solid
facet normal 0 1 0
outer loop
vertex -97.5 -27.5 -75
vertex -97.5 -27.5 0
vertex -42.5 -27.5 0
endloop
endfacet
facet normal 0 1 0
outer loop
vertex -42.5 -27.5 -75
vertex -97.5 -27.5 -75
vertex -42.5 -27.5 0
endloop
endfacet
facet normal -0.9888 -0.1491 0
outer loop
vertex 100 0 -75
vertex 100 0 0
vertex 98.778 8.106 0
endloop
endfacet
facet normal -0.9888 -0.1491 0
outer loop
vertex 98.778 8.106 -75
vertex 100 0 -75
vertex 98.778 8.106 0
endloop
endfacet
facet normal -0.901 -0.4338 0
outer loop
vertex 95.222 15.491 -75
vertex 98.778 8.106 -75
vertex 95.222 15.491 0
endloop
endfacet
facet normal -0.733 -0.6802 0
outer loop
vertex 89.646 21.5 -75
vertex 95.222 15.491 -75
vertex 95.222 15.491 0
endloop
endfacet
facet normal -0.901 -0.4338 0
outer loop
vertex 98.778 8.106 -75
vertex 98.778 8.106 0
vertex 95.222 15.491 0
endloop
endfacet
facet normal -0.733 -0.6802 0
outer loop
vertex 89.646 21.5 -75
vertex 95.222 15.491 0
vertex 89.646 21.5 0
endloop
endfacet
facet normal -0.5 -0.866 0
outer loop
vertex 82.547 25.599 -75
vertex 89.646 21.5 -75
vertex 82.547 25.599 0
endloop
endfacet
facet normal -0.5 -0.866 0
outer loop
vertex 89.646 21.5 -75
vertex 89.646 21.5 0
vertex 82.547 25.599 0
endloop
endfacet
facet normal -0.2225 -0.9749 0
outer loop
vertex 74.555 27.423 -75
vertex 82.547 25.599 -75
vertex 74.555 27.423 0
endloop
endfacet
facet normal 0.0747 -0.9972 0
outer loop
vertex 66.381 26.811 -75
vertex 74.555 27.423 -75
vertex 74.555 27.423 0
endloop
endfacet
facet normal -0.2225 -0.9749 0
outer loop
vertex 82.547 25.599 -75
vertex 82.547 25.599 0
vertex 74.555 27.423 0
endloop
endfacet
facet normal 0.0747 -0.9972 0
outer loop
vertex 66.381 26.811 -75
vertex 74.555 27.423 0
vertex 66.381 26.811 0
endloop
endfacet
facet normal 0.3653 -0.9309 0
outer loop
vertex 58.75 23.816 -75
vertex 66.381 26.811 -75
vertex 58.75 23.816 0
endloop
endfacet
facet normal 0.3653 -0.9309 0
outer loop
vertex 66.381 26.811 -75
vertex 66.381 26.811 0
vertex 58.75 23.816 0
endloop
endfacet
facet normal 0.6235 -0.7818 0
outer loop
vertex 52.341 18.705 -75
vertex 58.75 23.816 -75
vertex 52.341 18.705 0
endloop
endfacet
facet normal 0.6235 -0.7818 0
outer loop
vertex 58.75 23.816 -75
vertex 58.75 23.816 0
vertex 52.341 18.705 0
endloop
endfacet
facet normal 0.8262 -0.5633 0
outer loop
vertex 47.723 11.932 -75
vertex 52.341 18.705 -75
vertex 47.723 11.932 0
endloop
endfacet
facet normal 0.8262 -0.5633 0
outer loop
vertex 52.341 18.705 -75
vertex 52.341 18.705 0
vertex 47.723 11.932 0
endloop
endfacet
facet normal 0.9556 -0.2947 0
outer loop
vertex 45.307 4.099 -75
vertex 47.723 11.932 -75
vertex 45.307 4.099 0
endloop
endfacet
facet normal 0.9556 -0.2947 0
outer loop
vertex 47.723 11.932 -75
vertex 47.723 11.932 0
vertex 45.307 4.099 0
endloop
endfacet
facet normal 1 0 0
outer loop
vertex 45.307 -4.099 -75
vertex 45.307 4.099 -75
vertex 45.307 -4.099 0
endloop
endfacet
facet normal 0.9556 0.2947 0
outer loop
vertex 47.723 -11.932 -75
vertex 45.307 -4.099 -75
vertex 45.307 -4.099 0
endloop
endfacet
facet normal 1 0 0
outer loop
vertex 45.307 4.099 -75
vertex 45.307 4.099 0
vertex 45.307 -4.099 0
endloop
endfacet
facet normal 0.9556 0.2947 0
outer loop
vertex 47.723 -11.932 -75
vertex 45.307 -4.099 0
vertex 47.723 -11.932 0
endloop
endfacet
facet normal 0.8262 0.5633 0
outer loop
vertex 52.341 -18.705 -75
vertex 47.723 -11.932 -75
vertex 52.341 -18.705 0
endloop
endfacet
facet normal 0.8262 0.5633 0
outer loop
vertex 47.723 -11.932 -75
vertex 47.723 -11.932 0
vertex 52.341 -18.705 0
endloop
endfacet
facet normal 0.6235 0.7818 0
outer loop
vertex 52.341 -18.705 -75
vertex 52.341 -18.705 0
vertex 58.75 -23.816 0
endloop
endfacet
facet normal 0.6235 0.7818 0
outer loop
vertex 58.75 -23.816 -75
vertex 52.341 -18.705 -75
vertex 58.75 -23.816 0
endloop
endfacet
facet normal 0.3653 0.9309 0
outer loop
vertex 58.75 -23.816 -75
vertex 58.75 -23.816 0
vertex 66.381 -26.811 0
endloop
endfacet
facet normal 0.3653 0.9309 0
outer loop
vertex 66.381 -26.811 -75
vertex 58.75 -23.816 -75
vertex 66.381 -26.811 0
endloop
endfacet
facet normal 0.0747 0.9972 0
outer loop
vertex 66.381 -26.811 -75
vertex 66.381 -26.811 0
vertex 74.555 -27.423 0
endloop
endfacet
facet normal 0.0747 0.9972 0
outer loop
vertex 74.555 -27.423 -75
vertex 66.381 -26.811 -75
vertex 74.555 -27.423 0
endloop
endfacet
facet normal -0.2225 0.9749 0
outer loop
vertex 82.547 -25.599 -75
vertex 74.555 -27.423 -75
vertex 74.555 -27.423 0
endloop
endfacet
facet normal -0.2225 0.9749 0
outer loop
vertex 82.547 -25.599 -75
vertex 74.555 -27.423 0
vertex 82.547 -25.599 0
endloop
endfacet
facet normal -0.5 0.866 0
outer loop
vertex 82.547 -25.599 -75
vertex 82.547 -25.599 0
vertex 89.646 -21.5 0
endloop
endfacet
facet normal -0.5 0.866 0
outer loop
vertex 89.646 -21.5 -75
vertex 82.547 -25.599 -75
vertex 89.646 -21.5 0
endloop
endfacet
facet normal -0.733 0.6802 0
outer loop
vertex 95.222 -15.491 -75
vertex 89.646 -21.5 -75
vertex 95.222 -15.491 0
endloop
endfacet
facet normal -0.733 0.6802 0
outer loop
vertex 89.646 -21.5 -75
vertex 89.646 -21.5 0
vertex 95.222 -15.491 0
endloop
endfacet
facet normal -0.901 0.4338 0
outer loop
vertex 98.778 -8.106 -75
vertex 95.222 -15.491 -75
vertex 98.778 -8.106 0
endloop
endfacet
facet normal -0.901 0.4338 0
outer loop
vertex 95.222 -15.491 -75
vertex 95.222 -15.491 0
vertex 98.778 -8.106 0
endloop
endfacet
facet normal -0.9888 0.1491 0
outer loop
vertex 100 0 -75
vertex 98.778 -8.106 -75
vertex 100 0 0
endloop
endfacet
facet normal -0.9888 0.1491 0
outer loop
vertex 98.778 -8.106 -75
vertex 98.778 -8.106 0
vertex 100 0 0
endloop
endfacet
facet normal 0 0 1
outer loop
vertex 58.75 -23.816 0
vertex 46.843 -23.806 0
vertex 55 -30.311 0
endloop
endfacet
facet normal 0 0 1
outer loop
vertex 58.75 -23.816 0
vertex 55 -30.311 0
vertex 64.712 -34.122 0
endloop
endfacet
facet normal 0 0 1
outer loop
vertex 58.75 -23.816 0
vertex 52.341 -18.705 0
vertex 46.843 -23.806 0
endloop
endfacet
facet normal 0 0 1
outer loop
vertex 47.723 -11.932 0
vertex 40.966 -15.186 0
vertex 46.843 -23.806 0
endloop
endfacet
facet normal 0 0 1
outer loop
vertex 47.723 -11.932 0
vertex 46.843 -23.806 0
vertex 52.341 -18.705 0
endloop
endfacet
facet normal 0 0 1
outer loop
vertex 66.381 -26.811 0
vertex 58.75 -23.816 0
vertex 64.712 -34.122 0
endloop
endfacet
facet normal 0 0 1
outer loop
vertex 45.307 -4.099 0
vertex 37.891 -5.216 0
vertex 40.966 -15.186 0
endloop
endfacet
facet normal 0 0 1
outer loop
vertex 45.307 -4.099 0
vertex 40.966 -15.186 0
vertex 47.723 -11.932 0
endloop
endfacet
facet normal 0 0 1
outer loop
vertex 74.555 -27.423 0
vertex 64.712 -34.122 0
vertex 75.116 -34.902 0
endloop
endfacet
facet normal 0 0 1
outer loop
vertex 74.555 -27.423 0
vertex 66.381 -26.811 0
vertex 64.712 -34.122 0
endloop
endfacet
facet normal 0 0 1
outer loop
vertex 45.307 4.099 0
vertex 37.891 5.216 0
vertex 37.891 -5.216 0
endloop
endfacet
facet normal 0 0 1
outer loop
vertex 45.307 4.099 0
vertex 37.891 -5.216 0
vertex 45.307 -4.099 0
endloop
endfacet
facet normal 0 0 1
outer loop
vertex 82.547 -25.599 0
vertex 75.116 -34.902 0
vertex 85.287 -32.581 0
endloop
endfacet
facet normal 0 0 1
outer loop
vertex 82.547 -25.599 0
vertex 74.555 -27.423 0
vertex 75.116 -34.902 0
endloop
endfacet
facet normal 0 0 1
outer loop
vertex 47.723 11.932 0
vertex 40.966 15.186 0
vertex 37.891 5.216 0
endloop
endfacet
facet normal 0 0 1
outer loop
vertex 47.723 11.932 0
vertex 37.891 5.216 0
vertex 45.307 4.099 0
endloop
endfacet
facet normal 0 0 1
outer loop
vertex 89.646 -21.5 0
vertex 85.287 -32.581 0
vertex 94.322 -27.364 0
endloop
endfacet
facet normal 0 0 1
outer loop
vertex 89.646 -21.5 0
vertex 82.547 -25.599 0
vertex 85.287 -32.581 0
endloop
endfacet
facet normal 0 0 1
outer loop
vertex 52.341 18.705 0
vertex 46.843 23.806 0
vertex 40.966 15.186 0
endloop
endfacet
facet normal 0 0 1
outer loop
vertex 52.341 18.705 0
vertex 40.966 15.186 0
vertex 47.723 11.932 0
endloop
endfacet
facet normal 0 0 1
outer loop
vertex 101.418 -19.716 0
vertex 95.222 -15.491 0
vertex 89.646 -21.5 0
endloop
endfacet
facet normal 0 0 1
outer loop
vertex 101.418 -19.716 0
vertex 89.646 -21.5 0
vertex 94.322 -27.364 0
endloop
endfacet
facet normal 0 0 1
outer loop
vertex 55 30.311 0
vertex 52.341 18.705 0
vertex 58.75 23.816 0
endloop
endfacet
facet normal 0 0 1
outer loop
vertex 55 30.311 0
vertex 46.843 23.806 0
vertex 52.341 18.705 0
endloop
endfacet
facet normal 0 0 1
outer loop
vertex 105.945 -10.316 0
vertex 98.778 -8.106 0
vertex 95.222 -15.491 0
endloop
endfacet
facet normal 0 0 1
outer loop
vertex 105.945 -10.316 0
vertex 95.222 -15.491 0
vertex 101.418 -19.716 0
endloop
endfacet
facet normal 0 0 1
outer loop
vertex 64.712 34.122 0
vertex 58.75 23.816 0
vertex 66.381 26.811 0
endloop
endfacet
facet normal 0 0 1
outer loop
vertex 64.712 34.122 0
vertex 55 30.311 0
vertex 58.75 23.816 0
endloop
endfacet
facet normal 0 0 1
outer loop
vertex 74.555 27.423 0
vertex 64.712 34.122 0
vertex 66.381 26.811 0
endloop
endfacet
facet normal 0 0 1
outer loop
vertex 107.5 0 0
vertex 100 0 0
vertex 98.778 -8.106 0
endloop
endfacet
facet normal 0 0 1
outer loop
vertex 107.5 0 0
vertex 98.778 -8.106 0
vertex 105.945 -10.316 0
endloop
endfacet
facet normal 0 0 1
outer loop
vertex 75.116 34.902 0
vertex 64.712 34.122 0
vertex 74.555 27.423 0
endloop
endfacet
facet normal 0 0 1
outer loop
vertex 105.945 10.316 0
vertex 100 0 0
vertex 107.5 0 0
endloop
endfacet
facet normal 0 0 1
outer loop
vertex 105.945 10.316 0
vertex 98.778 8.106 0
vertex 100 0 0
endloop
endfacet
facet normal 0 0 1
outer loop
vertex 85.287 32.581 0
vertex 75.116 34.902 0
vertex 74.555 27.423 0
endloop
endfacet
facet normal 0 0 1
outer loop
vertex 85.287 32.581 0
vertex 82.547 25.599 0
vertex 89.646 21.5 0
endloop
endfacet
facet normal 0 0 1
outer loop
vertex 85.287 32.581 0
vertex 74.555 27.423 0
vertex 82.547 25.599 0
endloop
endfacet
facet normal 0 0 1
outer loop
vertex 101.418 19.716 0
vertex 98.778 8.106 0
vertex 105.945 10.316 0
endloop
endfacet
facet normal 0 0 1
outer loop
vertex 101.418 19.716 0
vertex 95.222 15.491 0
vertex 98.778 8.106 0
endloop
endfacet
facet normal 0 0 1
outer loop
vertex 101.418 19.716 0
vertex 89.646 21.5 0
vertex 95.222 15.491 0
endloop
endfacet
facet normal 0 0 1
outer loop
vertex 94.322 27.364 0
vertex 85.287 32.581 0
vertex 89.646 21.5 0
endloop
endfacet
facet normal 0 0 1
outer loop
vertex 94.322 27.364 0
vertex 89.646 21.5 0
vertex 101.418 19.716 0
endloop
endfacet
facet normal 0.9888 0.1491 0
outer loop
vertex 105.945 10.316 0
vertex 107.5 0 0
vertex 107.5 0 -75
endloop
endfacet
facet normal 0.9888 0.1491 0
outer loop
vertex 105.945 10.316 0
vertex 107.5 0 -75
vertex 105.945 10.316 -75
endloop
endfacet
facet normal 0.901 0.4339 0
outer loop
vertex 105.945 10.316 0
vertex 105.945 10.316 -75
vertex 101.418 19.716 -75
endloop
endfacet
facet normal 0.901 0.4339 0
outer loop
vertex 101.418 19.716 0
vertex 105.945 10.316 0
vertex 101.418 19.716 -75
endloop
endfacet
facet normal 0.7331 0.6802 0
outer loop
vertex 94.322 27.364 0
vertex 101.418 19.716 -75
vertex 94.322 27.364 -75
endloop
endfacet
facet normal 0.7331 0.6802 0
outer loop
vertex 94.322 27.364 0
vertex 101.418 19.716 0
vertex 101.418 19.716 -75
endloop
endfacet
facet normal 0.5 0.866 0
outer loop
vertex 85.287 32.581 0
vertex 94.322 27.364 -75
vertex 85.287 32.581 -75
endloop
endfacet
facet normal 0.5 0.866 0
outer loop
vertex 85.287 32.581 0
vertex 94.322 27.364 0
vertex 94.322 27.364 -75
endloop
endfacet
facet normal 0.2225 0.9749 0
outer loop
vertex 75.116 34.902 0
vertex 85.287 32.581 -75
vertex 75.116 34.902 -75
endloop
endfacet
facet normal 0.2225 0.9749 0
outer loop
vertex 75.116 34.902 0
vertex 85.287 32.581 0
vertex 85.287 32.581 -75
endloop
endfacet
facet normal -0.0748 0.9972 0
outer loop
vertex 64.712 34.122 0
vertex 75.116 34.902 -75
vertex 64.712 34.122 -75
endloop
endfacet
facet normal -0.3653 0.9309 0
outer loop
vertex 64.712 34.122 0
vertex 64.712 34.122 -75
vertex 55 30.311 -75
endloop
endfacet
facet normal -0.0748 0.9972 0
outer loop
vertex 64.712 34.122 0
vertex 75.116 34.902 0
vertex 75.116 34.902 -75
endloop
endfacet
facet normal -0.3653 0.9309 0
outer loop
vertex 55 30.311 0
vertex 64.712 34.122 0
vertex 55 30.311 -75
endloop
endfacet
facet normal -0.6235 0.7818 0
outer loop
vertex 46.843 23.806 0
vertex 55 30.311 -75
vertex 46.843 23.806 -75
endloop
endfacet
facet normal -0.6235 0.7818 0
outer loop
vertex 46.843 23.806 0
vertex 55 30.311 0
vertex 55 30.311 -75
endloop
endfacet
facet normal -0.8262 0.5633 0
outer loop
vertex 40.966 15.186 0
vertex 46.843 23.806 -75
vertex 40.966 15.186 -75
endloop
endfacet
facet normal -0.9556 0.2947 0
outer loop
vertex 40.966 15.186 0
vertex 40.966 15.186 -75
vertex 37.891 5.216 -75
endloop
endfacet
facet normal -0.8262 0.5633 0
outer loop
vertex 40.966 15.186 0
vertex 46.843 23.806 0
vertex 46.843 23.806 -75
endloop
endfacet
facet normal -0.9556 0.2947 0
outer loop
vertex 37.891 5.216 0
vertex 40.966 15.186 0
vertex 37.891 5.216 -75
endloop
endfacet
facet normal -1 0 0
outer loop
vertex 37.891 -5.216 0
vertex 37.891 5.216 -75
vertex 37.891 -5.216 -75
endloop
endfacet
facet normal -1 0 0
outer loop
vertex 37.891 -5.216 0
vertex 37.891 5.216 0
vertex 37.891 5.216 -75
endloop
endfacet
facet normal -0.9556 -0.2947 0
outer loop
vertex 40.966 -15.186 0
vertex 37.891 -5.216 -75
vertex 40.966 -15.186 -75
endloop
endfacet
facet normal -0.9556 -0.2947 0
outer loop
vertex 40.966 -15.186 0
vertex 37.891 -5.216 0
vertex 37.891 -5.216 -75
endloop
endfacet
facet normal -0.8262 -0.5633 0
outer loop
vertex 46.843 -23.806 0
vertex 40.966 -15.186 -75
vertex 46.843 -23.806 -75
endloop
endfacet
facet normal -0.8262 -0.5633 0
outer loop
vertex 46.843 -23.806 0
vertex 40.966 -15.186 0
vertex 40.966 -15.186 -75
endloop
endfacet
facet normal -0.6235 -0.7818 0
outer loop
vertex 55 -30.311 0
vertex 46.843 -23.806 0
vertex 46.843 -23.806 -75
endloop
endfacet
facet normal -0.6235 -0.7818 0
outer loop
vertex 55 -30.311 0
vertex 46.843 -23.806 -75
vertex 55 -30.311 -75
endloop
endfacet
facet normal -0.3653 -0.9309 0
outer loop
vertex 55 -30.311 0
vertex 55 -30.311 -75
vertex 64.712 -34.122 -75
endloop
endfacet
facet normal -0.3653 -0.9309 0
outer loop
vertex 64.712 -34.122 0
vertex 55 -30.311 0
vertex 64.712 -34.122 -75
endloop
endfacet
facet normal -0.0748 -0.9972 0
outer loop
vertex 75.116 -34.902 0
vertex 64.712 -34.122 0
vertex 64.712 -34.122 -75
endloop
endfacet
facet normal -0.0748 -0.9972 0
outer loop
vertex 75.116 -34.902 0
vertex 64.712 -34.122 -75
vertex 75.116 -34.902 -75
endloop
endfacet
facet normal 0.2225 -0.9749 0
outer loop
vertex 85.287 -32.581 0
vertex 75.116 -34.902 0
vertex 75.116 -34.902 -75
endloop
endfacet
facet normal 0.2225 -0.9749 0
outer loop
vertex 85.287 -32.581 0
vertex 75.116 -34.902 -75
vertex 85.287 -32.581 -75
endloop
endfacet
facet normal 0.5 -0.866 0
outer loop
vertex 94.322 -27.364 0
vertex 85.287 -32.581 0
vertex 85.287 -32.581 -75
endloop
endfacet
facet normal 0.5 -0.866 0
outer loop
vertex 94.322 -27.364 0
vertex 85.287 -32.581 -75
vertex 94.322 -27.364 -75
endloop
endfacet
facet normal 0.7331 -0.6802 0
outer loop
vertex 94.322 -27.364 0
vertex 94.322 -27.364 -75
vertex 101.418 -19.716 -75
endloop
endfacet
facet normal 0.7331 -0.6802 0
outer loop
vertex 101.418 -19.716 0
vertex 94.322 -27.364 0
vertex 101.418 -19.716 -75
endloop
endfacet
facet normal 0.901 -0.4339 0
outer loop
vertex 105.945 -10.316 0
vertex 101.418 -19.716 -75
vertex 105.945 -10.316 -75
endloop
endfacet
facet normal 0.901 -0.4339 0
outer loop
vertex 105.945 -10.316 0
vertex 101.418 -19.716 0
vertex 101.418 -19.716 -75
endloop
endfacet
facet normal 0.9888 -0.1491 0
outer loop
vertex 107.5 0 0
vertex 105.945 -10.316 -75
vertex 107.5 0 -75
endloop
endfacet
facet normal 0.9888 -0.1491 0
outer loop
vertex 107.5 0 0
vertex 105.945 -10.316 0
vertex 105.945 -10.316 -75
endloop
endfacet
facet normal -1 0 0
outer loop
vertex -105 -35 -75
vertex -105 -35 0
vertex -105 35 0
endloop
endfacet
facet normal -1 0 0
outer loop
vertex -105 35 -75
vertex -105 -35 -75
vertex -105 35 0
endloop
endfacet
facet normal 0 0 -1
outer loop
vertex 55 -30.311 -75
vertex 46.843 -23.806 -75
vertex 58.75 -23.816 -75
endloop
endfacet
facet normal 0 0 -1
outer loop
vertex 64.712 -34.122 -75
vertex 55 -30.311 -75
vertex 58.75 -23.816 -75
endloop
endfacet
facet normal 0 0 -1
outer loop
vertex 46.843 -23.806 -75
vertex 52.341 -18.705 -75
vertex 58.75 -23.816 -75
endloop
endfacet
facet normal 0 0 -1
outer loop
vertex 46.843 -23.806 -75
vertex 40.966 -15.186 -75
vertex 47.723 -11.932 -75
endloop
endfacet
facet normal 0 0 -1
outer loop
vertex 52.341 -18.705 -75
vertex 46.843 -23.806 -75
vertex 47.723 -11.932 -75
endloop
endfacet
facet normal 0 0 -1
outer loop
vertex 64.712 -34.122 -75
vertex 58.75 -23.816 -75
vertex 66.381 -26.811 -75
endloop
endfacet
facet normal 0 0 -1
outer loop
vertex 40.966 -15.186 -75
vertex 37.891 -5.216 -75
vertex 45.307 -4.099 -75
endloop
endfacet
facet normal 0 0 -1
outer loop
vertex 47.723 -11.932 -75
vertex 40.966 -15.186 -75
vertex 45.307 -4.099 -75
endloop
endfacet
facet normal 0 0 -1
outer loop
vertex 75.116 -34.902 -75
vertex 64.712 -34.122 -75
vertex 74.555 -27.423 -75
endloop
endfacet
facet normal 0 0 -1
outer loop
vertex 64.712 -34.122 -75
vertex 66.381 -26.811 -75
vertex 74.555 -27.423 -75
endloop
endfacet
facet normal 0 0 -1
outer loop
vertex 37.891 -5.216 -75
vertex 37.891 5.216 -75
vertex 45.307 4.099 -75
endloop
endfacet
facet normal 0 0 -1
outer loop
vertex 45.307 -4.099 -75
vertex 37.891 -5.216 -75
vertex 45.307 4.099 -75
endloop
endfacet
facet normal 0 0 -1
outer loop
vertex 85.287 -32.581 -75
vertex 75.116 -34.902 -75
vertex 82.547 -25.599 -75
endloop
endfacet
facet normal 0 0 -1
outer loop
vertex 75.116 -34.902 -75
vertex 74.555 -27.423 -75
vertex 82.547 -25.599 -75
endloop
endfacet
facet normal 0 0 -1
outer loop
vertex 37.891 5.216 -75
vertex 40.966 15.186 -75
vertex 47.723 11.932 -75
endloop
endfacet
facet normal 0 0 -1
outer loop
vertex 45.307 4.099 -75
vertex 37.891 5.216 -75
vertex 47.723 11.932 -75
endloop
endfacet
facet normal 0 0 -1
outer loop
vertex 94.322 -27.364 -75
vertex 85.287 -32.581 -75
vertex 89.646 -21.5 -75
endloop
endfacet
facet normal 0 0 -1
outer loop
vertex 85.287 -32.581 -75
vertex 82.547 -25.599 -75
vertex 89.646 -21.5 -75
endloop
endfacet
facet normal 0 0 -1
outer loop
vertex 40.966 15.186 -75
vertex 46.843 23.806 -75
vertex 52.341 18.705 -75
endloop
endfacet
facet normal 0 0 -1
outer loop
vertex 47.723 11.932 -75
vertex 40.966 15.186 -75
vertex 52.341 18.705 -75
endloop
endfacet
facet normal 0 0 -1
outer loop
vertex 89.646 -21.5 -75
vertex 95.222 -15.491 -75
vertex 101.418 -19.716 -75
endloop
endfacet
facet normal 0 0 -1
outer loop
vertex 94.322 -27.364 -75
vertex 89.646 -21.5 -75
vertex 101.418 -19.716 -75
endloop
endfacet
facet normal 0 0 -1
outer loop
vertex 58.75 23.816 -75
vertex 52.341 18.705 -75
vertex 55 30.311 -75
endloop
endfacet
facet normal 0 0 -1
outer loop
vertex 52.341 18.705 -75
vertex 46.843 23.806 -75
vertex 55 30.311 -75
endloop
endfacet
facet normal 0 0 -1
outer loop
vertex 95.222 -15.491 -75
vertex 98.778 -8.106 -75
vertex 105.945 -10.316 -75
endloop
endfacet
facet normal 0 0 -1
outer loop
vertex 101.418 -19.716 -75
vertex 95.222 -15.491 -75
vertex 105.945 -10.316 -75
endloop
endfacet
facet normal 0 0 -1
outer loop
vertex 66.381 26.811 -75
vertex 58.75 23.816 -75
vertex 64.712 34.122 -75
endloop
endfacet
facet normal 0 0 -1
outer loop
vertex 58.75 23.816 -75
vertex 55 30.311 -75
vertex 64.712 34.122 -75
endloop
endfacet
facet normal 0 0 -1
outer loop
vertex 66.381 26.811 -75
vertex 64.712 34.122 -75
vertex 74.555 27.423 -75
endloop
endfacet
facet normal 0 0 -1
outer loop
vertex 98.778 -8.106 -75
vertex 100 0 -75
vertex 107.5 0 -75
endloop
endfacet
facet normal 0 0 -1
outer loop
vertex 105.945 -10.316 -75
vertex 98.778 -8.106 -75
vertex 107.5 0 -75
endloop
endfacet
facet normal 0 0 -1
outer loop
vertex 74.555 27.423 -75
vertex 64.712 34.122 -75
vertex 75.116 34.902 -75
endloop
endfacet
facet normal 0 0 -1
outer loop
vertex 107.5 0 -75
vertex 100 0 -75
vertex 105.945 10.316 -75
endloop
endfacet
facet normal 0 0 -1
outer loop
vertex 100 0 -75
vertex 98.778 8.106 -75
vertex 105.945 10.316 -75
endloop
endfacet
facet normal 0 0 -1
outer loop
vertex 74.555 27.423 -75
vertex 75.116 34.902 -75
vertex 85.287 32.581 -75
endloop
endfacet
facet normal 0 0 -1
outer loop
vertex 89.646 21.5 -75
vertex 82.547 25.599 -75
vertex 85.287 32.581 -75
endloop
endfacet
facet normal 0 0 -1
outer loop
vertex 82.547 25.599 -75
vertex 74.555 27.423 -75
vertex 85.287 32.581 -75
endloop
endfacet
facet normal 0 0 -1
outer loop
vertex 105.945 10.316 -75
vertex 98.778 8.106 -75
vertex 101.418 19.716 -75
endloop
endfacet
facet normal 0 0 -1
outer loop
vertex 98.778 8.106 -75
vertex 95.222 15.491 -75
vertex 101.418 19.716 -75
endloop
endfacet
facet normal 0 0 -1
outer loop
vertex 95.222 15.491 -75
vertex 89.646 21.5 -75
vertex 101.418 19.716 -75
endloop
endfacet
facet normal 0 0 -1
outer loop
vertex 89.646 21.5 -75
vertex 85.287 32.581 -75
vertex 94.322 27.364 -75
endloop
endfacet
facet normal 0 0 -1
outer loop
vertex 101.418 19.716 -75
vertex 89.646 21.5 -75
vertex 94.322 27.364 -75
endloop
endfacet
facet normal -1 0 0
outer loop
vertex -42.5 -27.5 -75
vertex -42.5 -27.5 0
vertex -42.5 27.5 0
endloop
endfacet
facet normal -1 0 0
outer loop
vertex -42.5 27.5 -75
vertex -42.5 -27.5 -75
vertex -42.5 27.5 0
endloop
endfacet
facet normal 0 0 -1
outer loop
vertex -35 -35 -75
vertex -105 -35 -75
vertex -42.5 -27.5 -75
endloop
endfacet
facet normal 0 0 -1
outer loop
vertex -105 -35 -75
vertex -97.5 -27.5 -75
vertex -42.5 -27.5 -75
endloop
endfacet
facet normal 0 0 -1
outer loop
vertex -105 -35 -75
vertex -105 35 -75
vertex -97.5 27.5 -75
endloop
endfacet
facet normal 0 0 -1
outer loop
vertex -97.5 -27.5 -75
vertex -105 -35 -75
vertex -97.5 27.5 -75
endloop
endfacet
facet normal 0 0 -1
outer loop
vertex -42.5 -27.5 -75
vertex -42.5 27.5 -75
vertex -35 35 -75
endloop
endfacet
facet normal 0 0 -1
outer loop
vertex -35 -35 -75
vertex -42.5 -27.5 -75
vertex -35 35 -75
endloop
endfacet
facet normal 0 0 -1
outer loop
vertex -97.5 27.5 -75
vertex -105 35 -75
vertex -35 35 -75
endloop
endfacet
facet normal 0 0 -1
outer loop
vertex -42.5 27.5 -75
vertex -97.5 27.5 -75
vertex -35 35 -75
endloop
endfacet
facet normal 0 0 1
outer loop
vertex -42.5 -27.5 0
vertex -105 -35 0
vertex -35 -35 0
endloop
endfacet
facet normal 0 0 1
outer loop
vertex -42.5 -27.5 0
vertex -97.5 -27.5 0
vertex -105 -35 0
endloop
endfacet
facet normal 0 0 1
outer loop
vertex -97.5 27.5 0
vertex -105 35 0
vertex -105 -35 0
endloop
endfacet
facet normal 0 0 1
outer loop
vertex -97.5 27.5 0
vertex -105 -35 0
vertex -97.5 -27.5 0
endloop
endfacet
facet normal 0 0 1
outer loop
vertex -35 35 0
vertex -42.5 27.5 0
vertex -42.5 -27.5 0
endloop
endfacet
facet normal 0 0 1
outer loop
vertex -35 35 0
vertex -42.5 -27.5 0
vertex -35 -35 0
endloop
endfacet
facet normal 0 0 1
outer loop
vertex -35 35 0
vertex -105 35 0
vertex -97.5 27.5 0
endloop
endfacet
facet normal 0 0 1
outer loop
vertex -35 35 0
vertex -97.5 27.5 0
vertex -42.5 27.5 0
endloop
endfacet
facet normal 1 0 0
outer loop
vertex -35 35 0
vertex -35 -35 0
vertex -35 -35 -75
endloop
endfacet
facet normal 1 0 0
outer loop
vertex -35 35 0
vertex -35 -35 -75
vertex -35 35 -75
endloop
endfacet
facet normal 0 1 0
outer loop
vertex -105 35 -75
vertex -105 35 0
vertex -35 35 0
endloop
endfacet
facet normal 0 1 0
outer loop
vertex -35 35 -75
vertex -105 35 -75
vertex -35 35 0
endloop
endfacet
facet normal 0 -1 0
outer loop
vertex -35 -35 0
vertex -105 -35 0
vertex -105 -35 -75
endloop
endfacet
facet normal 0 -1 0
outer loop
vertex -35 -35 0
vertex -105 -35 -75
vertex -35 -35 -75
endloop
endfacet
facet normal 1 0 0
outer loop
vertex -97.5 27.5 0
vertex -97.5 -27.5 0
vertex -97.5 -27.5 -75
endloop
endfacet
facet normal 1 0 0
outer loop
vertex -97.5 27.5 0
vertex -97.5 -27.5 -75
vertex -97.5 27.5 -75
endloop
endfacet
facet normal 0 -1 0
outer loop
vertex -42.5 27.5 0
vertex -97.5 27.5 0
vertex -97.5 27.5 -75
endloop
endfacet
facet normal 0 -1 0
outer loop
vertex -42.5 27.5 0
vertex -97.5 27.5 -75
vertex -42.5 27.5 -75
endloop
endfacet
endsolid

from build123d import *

# Parameters (mm, degrees)
SKETCH3_W             = 70
SKETCH3_H             = 70
SKETCH3_W_2           = 55
SKETCH3_H_2           = 55
BOSS_EXTRUDE4_DEPTH   = 75
SKETCH3_R             = 35
SKETCH3_R_2           = 27.5
BOSS_EXTRUDE4_2_DEPTH = 75


with BuildPart() as part:
    # Sketch3 → Boss-Extrude4 (new body)
    with BuildSketch(Plane.XY):
        with Locations((-70, 0)):
            Rectangle(SKETCH3_W, SKETCH3_H)
        with Locations((-70, 0)):
            Rectangle(SKETCH3_W_2, SKETCH3_H_2, mode=Mode.SUBTRACT)
    extrude(amount=-BOSS_EXTRUDE4_DEPTH)


with BuildPart() as body_2:
    # Sketch3 → Boss-Extrude4 2 (new body)
    with BuildSketch(Plane.XY):
        with Locations((72.5, 0)):
            Circle(SKETCH3_R)
        with Locations((72.5, 0)):
            Circle(SKETCH3_R_2, mode=Mode.SUBTRACT)
    extrude(amount=-BOSS_EXTRUDE4_2_DEPTH)


solid = Compound([part.part, body_2.part])
